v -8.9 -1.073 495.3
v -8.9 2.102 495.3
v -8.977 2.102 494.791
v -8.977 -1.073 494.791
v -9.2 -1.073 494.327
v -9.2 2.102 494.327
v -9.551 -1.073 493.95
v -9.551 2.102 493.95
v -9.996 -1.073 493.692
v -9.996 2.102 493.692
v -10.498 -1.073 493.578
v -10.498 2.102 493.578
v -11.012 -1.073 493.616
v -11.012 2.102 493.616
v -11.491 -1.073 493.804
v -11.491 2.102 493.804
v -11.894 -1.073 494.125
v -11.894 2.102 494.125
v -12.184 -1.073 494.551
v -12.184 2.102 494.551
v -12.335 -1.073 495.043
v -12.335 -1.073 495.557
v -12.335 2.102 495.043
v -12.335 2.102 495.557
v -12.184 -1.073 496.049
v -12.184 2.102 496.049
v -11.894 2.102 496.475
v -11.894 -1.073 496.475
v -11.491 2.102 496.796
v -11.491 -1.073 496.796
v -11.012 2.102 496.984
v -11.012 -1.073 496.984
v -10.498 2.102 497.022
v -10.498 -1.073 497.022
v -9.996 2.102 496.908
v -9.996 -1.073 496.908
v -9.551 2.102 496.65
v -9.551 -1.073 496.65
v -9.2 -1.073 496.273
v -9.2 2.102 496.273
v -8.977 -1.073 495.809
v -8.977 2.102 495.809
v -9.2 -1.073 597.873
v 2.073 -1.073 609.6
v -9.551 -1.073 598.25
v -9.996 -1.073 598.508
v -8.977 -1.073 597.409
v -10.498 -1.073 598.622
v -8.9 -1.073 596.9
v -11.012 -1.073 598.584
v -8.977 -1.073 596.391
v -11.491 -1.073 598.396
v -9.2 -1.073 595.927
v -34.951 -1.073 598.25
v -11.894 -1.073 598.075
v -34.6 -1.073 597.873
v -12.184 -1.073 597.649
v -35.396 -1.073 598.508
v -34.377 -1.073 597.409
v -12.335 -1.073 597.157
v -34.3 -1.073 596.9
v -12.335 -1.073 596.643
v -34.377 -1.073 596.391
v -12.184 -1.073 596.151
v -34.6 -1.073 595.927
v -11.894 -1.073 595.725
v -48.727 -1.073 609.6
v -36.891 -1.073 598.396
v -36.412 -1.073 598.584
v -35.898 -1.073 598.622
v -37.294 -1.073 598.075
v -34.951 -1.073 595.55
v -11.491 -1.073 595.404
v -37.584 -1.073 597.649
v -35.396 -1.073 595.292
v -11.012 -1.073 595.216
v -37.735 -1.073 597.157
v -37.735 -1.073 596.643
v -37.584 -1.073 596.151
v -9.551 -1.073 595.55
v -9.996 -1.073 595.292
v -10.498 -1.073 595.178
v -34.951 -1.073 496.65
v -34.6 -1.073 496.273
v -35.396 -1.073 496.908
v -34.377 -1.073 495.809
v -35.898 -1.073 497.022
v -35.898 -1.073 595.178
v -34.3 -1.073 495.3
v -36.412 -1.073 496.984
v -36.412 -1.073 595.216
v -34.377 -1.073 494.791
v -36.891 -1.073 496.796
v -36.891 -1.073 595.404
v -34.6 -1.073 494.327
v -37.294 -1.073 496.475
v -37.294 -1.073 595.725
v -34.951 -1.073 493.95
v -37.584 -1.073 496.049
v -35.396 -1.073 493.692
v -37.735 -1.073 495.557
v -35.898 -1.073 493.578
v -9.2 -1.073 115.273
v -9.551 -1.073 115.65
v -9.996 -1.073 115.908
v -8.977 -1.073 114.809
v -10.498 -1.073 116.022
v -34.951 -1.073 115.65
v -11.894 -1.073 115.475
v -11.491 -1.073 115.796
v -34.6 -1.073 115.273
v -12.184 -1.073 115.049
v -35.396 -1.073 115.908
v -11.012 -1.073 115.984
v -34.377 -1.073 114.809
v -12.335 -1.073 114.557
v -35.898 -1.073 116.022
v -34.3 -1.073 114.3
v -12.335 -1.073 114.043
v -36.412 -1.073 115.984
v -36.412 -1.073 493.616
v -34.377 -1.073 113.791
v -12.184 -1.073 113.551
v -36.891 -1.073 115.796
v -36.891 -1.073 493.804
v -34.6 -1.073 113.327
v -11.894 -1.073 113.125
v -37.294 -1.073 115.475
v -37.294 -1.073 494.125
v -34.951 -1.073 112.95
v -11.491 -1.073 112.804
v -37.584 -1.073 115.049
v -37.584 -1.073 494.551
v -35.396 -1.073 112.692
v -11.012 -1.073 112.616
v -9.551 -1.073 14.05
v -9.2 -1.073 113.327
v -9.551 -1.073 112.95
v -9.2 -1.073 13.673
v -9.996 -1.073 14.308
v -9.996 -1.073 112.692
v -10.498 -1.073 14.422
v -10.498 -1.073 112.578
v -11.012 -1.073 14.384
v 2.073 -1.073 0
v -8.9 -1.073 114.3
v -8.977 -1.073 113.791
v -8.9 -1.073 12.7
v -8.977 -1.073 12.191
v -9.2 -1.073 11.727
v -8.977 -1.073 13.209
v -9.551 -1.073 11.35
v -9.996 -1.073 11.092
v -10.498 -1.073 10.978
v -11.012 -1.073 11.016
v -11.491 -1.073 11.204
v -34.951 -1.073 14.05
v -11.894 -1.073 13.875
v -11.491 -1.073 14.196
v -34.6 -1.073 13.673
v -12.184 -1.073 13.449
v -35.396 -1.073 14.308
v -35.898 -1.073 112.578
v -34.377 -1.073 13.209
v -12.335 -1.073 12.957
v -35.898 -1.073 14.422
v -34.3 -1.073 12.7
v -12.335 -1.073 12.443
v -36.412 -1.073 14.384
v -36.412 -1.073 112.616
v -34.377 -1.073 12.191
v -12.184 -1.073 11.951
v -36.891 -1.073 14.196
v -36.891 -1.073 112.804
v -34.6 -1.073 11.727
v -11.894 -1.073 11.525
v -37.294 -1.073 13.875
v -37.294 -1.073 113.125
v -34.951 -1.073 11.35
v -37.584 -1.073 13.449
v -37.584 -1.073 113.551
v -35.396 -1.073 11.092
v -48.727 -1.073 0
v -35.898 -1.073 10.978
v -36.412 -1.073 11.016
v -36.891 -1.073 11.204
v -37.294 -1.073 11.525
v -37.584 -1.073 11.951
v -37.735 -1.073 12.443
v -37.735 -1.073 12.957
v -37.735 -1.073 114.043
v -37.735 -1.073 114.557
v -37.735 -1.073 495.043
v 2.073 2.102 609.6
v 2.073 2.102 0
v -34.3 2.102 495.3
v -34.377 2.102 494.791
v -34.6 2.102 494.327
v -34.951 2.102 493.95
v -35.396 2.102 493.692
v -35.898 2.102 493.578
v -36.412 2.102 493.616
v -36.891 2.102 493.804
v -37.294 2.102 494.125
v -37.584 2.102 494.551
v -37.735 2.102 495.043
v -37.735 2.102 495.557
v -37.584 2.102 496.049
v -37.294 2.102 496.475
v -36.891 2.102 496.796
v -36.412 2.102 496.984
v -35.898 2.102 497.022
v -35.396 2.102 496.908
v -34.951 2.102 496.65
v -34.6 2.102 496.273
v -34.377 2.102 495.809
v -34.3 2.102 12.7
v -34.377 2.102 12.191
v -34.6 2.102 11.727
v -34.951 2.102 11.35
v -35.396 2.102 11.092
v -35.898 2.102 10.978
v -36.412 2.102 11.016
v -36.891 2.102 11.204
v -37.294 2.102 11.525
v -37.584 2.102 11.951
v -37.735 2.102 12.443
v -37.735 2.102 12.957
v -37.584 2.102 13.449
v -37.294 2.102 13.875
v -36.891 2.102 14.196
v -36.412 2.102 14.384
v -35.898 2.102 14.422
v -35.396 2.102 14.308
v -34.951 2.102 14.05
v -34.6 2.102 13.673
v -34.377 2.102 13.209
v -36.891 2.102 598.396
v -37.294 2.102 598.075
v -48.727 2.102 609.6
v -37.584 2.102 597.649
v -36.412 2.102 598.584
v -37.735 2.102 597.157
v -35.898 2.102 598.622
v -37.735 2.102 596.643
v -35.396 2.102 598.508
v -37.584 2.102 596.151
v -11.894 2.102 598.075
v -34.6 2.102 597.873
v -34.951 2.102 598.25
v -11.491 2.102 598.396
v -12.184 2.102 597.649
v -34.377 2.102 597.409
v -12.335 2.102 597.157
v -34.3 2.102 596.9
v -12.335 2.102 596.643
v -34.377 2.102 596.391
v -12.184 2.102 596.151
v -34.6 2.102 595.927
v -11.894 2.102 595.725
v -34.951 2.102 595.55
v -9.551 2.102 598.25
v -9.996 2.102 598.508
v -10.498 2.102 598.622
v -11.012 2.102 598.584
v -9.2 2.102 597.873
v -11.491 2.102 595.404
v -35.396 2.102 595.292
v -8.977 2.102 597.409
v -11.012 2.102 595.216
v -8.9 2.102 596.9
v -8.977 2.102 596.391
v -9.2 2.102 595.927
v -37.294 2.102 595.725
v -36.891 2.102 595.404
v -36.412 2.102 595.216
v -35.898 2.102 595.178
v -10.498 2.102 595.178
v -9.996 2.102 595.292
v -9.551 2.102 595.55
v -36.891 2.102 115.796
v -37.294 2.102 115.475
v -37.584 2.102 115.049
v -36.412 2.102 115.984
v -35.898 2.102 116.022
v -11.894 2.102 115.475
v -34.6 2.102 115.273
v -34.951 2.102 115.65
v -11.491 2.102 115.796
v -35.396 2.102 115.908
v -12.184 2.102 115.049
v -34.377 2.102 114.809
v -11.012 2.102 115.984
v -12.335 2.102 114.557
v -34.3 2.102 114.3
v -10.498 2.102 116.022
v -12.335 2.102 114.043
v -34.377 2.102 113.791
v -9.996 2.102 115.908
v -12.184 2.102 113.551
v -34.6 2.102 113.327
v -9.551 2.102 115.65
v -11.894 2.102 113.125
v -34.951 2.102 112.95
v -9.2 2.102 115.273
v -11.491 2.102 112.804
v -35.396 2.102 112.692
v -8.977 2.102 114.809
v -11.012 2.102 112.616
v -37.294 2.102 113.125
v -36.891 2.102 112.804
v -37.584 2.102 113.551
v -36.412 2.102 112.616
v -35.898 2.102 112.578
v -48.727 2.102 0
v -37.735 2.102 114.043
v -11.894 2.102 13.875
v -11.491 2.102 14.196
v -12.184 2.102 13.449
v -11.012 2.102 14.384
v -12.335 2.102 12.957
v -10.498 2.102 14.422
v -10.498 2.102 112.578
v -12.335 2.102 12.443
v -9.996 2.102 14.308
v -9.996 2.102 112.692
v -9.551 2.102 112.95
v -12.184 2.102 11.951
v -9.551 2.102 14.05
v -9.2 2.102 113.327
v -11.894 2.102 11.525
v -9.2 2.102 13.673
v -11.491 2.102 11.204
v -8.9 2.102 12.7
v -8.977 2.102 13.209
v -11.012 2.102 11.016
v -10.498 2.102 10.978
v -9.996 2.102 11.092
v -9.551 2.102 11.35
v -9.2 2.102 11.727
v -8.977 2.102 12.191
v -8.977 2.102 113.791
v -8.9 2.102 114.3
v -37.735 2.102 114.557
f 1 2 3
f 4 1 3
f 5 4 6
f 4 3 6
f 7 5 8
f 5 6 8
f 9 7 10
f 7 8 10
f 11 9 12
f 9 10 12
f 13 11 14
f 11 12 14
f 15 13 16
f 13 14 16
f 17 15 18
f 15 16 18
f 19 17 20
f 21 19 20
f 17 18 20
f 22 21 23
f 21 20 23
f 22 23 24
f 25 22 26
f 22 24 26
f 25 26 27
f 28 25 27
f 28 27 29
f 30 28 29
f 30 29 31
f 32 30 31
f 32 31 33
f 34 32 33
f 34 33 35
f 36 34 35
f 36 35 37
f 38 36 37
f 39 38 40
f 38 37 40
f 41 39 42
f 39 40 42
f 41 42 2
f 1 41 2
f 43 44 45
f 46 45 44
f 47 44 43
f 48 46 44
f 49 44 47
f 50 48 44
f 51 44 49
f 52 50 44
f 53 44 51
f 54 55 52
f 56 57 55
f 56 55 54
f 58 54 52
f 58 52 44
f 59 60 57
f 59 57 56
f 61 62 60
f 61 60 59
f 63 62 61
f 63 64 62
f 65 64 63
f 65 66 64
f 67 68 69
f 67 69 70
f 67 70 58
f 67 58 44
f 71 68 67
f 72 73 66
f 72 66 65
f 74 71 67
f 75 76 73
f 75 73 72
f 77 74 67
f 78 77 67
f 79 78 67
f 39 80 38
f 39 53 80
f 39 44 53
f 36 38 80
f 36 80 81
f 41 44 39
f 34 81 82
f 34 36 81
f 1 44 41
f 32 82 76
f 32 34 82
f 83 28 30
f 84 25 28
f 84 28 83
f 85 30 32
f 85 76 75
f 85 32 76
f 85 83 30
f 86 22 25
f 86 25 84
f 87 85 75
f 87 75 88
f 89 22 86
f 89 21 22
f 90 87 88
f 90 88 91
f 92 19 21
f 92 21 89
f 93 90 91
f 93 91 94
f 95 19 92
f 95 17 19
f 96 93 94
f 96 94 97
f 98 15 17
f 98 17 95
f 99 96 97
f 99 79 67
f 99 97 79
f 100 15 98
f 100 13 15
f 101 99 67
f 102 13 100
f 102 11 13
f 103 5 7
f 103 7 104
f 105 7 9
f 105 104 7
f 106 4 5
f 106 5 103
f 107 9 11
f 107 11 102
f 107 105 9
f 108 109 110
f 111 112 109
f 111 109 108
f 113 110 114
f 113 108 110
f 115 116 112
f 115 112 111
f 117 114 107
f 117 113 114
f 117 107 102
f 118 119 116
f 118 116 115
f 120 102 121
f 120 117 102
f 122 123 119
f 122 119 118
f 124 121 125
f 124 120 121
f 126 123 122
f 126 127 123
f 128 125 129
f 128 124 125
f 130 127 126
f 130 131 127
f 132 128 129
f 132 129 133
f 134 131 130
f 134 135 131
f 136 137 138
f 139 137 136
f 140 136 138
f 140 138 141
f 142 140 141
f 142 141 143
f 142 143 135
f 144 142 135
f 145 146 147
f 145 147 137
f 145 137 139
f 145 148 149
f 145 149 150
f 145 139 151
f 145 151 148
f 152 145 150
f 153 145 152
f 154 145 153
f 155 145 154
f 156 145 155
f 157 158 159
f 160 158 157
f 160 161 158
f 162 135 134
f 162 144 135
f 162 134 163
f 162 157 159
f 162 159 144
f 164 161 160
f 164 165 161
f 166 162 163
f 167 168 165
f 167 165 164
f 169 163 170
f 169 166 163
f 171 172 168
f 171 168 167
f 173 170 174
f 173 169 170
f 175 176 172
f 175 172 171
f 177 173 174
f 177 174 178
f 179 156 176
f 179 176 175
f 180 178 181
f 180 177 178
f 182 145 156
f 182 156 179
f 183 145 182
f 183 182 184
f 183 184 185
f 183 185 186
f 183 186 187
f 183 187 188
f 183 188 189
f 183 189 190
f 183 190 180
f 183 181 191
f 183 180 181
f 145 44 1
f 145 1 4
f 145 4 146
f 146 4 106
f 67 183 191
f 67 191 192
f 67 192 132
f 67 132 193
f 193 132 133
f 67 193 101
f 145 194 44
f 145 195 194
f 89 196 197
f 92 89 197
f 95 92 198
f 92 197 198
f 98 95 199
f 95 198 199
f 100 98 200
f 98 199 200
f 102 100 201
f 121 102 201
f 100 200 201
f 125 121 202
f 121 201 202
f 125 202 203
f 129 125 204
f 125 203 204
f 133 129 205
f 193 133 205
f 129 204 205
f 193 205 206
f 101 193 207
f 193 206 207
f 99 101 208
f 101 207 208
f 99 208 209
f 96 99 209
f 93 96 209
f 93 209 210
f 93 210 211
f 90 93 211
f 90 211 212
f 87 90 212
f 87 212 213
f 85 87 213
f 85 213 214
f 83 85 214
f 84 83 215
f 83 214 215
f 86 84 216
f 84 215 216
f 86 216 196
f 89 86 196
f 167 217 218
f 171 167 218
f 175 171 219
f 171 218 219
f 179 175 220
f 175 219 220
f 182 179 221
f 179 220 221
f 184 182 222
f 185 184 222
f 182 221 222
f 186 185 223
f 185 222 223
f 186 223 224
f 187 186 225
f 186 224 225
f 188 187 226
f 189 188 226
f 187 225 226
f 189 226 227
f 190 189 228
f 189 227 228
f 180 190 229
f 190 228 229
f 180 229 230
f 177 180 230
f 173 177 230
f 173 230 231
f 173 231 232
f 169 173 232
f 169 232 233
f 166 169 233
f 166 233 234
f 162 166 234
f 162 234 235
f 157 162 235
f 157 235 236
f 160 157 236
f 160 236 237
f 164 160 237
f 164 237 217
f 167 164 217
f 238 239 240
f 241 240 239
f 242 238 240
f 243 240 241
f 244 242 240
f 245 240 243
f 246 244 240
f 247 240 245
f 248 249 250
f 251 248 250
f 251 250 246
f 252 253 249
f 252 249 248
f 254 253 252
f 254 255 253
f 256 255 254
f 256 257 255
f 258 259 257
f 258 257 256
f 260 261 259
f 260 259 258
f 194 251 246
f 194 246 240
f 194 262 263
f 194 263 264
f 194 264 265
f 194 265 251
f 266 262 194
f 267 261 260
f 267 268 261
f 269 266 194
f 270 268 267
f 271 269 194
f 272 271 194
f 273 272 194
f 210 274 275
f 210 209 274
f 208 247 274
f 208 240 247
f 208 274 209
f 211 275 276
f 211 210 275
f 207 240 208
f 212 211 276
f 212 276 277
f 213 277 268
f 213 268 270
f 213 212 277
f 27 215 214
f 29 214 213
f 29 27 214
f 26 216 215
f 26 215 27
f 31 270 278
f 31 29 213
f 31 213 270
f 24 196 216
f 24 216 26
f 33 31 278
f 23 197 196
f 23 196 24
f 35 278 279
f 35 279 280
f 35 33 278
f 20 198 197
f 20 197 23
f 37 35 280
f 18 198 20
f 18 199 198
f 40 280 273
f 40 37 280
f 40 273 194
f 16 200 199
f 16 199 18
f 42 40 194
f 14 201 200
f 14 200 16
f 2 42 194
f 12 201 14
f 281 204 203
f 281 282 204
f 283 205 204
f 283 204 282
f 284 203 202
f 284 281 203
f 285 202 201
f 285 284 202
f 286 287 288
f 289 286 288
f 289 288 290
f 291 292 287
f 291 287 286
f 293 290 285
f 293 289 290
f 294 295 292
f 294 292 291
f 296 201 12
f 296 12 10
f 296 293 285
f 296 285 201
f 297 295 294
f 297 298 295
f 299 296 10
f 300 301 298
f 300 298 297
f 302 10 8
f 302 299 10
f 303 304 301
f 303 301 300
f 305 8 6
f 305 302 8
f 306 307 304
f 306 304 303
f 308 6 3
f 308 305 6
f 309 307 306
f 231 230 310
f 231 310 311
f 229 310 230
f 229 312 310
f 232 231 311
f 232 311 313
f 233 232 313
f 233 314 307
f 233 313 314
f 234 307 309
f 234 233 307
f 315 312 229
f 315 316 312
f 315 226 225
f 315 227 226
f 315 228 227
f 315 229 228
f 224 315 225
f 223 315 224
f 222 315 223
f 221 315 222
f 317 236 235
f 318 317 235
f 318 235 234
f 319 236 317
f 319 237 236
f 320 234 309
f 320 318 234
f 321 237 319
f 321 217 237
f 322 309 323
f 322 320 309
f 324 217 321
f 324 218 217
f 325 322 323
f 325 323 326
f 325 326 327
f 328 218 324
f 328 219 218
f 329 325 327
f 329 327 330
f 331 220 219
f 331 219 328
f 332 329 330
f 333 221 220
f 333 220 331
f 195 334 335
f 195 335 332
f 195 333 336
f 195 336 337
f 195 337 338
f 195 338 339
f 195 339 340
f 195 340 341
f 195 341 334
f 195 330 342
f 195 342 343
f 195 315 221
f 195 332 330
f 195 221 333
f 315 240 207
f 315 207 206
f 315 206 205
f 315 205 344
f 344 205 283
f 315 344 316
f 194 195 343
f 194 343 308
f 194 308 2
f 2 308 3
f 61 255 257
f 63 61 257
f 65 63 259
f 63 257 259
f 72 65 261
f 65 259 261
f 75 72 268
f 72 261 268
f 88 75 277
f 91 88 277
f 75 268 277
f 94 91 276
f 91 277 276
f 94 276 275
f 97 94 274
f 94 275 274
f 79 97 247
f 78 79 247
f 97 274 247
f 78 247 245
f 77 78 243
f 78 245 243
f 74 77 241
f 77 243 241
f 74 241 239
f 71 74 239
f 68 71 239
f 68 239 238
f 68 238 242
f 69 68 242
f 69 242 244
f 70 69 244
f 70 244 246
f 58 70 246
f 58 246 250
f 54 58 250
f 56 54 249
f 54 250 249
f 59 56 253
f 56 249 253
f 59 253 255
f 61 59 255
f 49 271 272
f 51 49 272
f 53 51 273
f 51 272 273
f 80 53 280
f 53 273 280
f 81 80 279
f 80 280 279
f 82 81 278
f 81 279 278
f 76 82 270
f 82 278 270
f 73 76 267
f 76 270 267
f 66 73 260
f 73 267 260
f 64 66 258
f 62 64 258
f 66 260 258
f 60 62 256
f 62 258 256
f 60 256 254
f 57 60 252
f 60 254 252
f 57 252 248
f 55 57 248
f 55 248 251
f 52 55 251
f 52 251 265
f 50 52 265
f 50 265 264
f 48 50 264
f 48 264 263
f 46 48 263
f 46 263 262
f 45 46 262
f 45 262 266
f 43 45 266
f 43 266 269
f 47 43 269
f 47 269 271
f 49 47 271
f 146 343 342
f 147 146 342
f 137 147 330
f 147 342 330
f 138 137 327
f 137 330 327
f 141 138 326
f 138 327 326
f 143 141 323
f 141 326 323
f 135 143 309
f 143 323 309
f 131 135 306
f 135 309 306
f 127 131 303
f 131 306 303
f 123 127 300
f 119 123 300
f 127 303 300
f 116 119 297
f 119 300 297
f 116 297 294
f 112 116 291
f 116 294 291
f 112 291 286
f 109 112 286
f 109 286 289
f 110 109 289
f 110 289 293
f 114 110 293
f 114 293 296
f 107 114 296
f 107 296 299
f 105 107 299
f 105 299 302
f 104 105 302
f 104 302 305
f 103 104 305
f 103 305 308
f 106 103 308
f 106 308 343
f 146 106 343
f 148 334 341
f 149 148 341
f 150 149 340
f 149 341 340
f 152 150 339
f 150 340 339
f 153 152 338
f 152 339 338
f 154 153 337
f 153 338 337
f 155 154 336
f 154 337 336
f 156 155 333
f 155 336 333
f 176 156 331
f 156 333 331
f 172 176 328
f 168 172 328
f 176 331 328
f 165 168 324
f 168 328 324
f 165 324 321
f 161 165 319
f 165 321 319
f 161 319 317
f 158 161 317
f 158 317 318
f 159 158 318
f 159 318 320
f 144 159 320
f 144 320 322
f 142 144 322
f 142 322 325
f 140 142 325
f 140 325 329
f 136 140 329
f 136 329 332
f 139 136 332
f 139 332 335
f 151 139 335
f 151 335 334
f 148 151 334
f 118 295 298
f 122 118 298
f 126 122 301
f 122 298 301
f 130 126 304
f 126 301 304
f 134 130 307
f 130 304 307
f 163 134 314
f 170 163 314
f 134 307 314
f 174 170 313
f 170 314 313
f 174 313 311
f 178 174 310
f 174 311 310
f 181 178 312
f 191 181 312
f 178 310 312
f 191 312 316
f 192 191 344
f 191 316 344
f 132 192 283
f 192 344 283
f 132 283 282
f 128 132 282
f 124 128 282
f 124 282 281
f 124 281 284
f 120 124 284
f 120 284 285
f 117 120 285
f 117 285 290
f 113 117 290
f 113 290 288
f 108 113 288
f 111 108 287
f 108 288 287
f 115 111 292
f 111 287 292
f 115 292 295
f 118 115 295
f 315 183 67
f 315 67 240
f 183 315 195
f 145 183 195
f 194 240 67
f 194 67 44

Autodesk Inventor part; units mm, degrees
ref_plane "YZ Plane" through (0, 0, 0) normal (1, 0, 0) x (0, 1, 0)
ref_plane "XZ Plane" through (0, 0, 0) normal (0, 1, 0) x (-1, 0, 0)
ref_plane "XY Plane" through (0, 0, 0) normal (0, 0, 1) x (1, 0, 0)
sketch "Sketch1" plane through (0, 0, 0) normal (0, 0, 1) x (1, 0, 0)
  line L0 (-48.7274, 2.102) -> (2.0726, 2.102)
  line L1 (2.0726, 2.102) -> (2.0726, -1.073)
  line L2 (2.0726, -1.073) -> (-48.7274, -1.073)
  line L3 (-48.7274, -1.073) -> (-48.7274, 2.102)
  point P0 (0, 0)
  dimension "d0" = 3.175
  dimension "d1" = 50.8
extrude "Extrusion1" add sketch "Sketch1" along normal blind 609.6
sketch "Sketch2" plane through (-48.7274, 2.102, 0) normal (0, 1, 0) x (1, 0, 0)
  circle A0 centre (12.7, -12.7) radius 1.7272
  circle A1 centre (38.1, -12.7) radius 1.7272
  line L0 (0, 0) -> (0, -609.6) projected
  line L1 (50.8, 0) -> (0, 0) projected
  line L2 (12.7, -12.7) -> (38.1, -12.7)
  point P0 (48.7274, 0)
  dimension "d5" = 3.4544
  dimension "d6" = 25.4
  dimension "d7" = 12.7
  dimension "d8" = 12.7
extrude "Extrusion2" cut sketch "Sketch2" against normal through all
pattern_linear "Rectangular Pattern1" count 2 spacing 584.2 along (0, 0, 1) of "Extrusion2"
pattern_linear "Rectangular Pattern2" count 2 spacing 101.6 along (0, 0, 1) count 2 spacing 482.6 along (0, 0, 1) of "Extrusion2"
equation "\"d3\" = d2"
equation "\"d2\" = 609.6"
properties part number "Flat Bar Drive"
